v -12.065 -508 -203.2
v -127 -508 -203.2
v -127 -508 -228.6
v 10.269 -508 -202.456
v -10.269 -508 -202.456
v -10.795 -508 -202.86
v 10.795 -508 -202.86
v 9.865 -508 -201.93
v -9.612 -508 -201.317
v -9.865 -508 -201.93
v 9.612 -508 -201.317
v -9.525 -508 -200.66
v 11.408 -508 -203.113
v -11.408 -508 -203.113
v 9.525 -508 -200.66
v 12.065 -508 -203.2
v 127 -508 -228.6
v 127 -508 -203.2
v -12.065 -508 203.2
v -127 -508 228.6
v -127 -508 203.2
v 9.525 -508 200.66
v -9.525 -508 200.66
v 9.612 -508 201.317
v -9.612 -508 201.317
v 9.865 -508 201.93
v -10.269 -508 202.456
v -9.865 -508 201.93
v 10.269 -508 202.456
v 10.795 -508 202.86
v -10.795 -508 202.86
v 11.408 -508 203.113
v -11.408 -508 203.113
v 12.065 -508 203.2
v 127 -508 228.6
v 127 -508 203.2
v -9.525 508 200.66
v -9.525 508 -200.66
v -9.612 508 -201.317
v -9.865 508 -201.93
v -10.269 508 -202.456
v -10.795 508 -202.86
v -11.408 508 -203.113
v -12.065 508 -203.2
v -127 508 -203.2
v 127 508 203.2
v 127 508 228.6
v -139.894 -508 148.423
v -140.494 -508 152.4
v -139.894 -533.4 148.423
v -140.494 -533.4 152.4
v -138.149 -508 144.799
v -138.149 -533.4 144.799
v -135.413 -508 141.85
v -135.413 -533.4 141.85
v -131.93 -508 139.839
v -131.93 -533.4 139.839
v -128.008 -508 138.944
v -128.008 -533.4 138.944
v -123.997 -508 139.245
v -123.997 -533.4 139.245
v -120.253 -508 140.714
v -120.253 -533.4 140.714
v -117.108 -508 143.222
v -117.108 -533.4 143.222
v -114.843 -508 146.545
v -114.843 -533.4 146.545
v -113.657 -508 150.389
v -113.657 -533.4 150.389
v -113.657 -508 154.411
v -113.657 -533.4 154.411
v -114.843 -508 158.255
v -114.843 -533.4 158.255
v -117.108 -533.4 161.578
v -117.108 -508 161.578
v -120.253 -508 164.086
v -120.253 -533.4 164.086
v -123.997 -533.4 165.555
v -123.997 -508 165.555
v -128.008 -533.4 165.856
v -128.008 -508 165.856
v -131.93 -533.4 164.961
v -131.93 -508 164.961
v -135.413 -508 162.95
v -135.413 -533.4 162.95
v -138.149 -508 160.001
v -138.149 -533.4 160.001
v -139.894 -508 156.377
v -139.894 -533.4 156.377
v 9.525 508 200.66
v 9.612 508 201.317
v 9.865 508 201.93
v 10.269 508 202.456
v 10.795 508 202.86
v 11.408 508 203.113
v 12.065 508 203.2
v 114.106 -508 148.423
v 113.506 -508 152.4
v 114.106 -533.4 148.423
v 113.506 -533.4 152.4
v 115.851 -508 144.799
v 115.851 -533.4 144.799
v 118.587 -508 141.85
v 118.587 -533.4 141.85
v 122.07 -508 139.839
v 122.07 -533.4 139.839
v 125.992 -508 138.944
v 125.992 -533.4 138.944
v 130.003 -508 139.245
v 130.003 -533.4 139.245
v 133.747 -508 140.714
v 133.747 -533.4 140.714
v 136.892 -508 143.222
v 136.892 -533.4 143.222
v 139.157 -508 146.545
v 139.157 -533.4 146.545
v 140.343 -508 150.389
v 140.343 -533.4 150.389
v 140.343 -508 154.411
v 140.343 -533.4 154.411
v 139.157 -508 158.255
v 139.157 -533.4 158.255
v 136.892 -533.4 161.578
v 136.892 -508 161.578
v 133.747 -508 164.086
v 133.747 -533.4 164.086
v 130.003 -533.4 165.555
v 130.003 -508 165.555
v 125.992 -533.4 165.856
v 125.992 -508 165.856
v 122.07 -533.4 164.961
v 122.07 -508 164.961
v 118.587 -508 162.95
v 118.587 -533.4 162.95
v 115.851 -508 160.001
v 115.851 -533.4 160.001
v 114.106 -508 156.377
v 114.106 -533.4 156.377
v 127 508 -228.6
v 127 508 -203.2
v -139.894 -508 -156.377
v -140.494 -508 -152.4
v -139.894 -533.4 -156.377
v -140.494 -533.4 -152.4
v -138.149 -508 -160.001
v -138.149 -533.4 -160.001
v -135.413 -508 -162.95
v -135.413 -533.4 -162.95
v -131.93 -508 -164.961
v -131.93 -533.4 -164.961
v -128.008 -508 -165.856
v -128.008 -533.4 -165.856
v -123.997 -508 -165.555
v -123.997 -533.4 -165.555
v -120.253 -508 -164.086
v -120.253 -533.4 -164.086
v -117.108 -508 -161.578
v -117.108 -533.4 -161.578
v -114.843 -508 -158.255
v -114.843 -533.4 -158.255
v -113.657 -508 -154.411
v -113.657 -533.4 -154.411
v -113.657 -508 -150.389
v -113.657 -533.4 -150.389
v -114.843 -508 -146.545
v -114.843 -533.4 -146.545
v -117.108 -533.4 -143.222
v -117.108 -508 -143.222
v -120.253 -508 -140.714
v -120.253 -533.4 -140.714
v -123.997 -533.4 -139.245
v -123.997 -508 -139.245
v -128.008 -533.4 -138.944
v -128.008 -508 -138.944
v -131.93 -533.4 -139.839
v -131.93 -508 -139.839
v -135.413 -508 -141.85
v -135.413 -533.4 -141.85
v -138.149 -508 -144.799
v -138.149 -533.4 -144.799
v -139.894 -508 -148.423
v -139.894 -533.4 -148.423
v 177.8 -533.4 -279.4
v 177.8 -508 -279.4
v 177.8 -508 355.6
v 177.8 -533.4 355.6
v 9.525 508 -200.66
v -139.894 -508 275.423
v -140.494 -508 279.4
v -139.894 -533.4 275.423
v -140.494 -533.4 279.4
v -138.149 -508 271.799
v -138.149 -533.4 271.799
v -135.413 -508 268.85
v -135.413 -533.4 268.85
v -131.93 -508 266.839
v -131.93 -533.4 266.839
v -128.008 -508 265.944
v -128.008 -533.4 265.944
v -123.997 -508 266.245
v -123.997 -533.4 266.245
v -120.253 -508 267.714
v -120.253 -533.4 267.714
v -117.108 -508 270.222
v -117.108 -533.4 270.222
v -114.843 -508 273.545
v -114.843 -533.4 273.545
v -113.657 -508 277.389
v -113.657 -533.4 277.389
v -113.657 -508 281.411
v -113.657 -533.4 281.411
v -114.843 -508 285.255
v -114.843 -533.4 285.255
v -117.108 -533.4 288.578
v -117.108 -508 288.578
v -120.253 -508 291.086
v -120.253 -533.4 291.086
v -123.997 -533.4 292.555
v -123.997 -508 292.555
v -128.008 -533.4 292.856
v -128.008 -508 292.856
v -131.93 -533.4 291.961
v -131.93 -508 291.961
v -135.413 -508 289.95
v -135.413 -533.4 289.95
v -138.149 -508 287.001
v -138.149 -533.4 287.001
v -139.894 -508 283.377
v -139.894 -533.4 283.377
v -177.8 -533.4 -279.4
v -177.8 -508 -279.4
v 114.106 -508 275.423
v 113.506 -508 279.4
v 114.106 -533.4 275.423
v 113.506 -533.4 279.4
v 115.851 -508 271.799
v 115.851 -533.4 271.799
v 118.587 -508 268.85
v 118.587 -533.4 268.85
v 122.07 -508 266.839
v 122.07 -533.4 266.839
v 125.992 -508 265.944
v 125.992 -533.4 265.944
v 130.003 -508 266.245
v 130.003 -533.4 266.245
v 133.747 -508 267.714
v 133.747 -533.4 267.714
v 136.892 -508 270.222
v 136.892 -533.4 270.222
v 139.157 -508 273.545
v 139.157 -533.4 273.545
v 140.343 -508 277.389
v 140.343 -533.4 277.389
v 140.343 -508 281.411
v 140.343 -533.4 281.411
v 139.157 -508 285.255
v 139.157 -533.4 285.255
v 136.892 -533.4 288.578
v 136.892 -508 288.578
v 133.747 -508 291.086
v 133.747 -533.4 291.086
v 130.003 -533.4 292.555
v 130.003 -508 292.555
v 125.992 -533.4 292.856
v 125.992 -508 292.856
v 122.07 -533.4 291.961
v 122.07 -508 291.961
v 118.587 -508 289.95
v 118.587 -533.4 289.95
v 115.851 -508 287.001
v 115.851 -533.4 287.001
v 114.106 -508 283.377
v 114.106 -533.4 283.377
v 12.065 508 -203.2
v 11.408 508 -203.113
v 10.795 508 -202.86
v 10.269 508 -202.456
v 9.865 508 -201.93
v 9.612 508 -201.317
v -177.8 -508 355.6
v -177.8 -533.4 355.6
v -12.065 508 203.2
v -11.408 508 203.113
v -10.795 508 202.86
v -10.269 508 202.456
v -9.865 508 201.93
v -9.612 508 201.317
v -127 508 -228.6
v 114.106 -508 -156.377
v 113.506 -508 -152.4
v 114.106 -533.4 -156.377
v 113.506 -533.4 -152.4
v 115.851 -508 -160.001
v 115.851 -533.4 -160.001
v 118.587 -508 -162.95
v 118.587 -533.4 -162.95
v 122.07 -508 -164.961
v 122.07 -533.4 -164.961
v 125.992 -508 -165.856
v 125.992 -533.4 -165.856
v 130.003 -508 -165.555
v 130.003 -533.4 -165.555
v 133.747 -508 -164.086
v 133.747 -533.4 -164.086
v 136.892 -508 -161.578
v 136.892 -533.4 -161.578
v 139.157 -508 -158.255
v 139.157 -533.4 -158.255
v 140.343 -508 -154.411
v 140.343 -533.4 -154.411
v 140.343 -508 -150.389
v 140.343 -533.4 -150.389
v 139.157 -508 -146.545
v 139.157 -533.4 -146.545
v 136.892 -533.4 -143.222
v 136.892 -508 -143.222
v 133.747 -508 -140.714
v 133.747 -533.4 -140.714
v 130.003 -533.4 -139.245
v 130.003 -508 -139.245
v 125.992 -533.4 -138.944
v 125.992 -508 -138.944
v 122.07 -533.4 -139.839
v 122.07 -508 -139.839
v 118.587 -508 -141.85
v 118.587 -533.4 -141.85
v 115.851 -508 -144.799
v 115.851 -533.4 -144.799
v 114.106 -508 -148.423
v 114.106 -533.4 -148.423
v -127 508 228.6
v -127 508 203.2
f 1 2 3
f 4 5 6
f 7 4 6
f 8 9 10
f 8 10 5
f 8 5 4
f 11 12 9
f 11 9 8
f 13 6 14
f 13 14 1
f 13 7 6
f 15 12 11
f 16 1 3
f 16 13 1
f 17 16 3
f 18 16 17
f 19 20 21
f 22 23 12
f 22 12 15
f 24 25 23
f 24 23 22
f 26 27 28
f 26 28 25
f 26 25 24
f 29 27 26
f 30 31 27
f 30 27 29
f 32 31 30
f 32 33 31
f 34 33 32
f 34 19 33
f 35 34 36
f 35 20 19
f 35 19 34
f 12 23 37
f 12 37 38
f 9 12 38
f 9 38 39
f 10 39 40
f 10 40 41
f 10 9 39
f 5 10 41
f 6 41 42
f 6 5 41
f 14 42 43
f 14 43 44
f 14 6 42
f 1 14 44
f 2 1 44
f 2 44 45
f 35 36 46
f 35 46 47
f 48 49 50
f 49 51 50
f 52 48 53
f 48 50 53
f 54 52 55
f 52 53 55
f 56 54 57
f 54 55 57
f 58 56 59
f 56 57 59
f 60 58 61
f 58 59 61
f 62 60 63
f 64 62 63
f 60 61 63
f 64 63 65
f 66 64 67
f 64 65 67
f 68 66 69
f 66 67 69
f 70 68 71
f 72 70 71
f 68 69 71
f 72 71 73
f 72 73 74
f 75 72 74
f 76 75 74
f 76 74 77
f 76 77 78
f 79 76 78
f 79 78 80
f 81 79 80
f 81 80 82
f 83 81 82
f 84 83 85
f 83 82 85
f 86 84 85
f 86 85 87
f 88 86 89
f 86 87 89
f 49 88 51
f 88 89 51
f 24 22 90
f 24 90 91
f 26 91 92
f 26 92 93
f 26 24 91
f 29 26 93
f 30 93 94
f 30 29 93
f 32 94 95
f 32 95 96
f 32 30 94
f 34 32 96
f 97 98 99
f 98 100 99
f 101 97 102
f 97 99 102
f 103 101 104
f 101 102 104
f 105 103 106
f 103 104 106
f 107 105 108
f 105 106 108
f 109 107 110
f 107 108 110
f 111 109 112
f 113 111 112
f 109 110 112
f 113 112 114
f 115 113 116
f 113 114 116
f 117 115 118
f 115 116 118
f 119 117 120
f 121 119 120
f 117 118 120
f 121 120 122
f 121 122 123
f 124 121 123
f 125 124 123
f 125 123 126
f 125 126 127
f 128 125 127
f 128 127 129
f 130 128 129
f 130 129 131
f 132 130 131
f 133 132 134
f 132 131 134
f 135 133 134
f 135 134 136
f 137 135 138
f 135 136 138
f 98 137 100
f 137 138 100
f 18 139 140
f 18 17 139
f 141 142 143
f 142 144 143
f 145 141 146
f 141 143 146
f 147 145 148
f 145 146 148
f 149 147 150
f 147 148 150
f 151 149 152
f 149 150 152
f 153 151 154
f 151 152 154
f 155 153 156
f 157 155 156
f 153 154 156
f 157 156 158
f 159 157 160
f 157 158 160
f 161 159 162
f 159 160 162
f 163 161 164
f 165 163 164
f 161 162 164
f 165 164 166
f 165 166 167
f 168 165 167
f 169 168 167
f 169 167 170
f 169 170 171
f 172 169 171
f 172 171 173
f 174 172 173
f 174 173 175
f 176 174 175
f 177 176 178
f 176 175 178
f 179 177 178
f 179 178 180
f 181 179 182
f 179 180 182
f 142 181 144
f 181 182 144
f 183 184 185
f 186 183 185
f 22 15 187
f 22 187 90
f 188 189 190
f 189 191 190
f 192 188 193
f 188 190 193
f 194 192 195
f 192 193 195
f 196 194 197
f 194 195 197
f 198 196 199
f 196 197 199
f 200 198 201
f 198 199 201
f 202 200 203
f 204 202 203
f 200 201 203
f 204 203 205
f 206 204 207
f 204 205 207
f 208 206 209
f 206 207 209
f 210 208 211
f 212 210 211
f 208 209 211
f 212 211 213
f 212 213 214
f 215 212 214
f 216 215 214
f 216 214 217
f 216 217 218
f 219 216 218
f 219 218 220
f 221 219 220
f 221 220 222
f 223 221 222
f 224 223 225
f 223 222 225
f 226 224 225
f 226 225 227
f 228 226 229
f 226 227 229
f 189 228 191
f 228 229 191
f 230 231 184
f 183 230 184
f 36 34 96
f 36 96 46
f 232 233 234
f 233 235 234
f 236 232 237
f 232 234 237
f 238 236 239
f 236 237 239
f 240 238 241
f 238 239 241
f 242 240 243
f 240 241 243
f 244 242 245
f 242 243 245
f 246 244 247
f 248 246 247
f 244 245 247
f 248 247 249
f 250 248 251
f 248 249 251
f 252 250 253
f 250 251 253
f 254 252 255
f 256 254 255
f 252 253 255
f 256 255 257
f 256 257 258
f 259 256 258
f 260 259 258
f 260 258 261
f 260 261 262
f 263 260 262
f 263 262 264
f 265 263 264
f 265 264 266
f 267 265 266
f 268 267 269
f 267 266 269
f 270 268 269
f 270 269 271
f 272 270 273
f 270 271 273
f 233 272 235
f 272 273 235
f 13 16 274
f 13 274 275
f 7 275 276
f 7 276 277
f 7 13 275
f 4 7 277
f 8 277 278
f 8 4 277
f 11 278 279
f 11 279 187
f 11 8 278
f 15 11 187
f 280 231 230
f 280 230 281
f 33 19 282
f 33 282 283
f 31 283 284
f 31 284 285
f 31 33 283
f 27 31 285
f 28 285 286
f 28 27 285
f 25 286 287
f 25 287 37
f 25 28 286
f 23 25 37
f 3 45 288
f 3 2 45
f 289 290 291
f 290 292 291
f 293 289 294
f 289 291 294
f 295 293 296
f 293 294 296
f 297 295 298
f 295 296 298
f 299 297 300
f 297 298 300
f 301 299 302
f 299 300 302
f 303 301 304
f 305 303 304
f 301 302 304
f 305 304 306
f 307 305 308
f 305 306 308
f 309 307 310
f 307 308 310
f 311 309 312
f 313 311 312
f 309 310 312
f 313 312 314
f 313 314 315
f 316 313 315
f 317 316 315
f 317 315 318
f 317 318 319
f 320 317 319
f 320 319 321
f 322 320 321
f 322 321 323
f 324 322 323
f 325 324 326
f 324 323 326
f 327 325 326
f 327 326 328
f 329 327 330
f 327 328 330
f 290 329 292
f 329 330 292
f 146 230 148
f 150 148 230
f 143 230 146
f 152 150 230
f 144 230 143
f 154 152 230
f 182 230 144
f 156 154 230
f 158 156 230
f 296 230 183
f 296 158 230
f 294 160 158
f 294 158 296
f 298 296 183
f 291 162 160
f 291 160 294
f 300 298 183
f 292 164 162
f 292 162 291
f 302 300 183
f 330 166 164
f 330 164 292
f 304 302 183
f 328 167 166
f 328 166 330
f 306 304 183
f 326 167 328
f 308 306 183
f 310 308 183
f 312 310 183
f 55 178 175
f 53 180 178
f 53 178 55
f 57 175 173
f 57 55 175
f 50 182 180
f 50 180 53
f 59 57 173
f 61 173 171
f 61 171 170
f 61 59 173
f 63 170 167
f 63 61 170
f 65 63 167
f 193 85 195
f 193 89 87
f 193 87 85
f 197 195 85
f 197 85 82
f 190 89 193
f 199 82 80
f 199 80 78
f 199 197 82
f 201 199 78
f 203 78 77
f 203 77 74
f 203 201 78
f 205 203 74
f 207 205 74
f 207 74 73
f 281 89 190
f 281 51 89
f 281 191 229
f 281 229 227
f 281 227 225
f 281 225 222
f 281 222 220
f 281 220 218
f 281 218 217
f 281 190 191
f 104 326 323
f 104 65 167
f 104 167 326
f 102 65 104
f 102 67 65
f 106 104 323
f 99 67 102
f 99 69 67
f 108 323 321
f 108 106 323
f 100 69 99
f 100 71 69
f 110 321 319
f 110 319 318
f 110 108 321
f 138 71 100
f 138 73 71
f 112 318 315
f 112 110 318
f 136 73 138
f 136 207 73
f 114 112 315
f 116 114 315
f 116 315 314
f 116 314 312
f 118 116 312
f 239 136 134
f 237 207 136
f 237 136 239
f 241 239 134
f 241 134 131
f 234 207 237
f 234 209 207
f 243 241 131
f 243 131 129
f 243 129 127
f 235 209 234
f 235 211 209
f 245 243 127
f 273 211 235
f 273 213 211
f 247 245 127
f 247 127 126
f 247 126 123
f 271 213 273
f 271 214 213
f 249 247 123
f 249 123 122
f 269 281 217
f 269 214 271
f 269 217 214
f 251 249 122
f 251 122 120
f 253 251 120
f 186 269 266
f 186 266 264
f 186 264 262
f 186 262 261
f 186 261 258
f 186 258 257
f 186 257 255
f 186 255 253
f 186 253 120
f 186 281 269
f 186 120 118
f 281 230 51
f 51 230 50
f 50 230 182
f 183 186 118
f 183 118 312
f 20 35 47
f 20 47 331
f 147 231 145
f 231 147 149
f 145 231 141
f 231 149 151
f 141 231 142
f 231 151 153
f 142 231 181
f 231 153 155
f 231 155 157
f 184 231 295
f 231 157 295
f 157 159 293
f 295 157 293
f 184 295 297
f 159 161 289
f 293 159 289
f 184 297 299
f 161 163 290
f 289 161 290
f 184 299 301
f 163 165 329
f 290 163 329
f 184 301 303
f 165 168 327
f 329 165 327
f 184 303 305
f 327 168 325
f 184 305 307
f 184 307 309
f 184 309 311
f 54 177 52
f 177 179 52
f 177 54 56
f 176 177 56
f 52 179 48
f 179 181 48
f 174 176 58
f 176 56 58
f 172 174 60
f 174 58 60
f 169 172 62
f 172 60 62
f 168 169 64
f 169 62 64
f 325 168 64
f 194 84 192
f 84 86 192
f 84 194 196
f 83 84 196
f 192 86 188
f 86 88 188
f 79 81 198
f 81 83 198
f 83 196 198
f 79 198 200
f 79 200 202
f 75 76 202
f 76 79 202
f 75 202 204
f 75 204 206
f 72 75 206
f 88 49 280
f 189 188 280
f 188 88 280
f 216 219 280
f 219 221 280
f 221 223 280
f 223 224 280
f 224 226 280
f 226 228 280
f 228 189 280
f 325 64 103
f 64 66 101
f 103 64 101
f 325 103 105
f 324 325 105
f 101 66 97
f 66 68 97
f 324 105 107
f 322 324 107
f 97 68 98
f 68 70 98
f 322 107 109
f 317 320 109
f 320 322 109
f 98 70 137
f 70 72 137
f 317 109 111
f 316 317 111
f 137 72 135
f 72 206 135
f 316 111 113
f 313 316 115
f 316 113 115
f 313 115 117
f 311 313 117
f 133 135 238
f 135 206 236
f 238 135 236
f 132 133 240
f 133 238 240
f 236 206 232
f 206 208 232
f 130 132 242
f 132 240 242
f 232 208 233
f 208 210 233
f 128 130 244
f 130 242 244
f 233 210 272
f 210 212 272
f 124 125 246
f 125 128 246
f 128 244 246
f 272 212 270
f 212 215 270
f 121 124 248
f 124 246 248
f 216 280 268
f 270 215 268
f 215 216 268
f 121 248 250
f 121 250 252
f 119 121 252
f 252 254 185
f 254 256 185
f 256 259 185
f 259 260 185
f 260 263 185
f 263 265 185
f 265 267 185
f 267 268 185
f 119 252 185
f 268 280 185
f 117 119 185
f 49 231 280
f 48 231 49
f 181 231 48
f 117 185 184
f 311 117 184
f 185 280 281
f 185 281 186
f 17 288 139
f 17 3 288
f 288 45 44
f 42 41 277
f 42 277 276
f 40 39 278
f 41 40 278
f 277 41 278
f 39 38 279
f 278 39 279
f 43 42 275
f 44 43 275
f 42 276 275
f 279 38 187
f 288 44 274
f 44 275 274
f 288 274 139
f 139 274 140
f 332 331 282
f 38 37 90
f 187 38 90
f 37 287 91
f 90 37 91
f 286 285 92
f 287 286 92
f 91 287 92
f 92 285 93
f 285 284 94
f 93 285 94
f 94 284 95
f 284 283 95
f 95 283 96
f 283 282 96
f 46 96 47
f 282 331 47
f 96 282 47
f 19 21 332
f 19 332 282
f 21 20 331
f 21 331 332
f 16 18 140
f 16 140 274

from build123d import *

# Parameters (mm, degrees)
F1_DEPTH = 508
F2_W     = 355.6
F2_H     = 635
F3_DEPTH = 25.4
F4_D     = 26.9875
F4_DEPTH = 25.4
F4_TIP   = 8.107862978


with BuildPart() as f1:
    # F0 (on Front) → F1 (new body, symmetric)
    with BuildSketch(Plane.XZ):
        with BuildLine():
            Line((127, -228.6), (127, -203.2))
            Line((127, -203.2), (12.065, -203.2))
            ThreePointArc((12.065, -203.2), (10.2689487758, -202.4560512242), (9.525, -200.66))
            Line((9.525, -200.66), (9.525, 200.66))
            ThreePointArc((9.525, 200.66), (10.2689487758, 202.4560512242), (12.065, 203.2))
            Line((12.065, 203.2), (127, 203.2))
            Line((127, 203.2), (127, 228.6))
            Line((127, 228.6), (-127, 228.6))
            Line((-127, 228.6), (-127, 203.2))
            Line((-127, 203.2), (-12.065, 203.2))
            ThreePointArc((-12.065, 203.2), (-10.2689487758, 202.4560512242), (-9.525, 200.66))
            Line((-9.525, 200.66), (-9.525, -200.66))
            ThreePointArc((-9.525, -200.66), (-10.2689487758, -202.4560512242), (-12.065, -203.2))
            Line((-12.065, -203.2), (-127, -203.2))
            Line((-127, -203.2), (-127, -228.6))
            Line((-127, -228.6), (127, -228.6))
        make_face()
    extrude(amount=F1_DEPTH, both=True)


with BuildPart() as f3:
    # F2 (on face) → F3 (new body)
    with BuildSketch(Plane.XZ.offset(508)):
        with Locations((0, 38.1)):
            Rectangle(F2_W, F2_H)
        with BuildLine():
            Line((-9.525, -200.66), (-9.525, 200.66))
            ThreePointArc((-9.525, 200.66), (-10.2689487758, 202.4560512242), (-12.065, 203.2))
            Line((-12.065, 203.2), (-127, 203.2))
            Line((-127, 203.2), (-127, 228.6))
            Line((-127, 228.6), (127, 228.6))
            Line((127, 228.6), (127, 203.2))
            Line((127, 203.2), (12.065, 203.2))
            ThreePointArc((12.065, 203.2), (10.2689487758, 202.4560512242), (9.525, 200.66))
            Line((9.525, 200.66), (9.525, -200.66))
            ThreePointArc((9.525, -200.66), (10.2689487758, -202.4560512242), (12.065, -203.2))
            Line((12.065, -203.2), (127, -203.2))
            Line((127, -203.2), (127, -228.6))
            Line((127, -228.6), (-127, -228.6))
            Line((-127, -228.6), (-127, -203.2))
            Line((-127, -203.2), (-12.065, -203.2))
            ThreePointArc((-12.065, -203.2), (-10.2689487758, -202.4560512242), (-9.525, -200.66))
        make_face(mode=Mode.SUBTRACT)
        with BuildLine():
            ThreePointArc((-12.065, 203.2), (-10.2689487758, 202.4560512242), (-9.525, 200.66))
            Line((-9.525, 200.66), (-9.525, -200.66))
            ThreePointArc((-9.525, -200.66), (-10.2689487758, -202.4560512242), (-12.065, -203.2))
            Line((-12.065, -203.2), (-127, -203.2))
            Line((-127, -203.2), (-127, -228.6))
            Line((-127, -228.6), (127, -228.6))
            Line((127, -228.6), (127, -203.2))
            Line((127, -203.2), (12.065, -203.2))
            ThreePointArc((12.065, -203.2), (10.2689487758, -202.4560512242), (9.525, -200.66))
            Line((9.525, -200.66), (9.525, 200.66))
            ThreePointArc((9.525, 200.66), (10.2689487758, 202.4560512242), (12.065, 203.2))
            Line((12.065, 203.2), (127, 203.2))
            Line((127, 203.2), (127, 228.6))
            Line((127, 228.6), (-127, 228.6))
            Line((-127, 228.6), (-127, 203.2))
            Line((-127, 203.2), (-12.065, 203.2))
        make_face()
    extrude(amount=F3_DEPTH)

    # F4
    with Locations(Plane(origin=(0, -508, 0), x_dir=(1, 0, 0), z_dir=(0, 1, 0))):
        with Locations((127, -279.4), (127, -152.4), (127, 152.4), (-127, 152.4), (-127, -152.4), (-127, -279.4)):
            Hole(F4_D / 2, depth=F4_DEPTH)
            with Locations((0, 0, -(F4_DEPTH + F4_TIP / 2))):  # 118° drill point
                Cone(0, F4_D / 2, F4_TIP, mode=Mode.SUBTRACT)


solid = Compound([f1.part, f3.part])
